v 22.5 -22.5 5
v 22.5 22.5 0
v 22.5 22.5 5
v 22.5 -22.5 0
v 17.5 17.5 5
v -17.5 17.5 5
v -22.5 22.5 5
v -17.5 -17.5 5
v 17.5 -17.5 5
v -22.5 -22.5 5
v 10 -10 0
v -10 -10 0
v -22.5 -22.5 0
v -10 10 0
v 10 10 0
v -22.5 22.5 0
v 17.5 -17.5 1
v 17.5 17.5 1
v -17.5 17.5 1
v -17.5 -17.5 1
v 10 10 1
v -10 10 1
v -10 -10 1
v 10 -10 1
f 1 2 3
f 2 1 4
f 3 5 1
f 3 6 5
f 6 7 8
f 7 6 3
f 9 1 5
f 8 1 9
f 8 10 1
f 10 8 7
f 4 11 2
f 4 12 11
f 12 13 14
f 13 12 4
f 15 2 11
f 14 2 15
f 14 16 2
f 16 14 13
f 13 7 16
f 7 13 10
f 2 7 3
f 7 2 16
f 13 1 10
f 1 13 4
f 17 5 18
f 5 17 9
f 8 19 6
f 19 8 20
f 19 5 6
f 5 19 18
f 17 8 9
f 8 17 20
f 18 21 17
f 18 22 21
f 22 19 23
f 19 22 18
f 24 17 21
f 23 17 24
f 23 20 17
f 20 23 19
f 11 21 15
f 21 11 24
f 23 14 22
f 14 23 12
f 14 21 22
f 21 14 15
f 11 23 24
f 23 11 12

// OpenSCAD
//Simple square mask
//Jeffrey Moffitt
//jeffmoffitt@gmail.com
//November 13, 2015
//CC BY NC SA

//Add the thread module

//Units are mm

//Define module
union(){
    difference(){
        translate([0,0,2.5])cube(size=[45, 45, 5], center=true);
        translate([0,0,2.5])cube(size=[35, 35, 5.1], center=true);
    }
    difference(){
        translate([0,0,0.5])cube(size=[45, 45, 1], center=true);
        translate([0,0,0.5])cube(size=[20,20,1.1], center=true);
    }
}

//
